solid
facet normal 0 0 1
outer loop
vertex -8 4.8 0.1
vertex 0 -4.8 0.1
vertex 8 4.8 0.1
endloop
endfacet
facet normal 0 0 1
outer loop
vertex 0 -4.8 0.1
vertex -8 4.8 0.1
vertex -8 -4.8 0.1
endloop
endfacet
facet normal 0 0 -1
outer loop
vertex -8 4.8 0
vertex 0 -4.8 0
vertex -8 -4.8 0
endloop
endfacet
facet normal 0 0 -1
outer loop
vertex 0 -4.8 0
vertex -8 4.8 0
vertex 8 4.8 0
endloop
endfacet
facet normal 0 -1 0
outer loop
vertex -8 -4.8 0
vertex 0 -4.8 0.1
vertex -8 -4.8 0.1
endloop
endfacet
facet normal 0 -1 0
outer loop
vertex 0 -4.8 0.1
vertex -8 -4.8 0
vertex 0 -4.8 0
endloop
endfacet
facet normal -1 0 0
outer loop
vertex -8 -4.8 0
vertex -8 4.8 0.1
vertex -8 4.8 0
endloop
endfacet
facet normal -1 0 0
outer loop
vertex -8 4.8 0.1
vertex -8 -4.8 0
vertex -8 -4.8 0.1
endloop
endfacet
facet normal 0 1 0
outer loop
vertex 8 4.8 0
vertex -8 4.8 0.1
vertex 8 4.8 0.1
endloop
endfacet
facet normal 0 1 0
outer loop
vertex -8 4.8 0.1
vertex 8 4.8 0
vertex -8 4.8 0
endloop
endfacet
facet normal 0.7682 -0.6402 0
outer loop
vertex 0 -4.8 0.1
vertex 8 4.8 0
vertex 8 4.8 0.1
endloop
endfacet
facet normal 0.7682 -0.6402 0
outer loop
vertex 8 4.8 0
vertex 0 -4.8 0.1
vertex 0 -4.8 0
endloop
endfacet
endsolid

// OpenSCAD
use <../lib.scad>
function ldraw_lib__164575b() = [
// 0 Sticker Train Front  2 x  6 Stripe Right
// 0 Name: 164575b.dat
// 0 Author: William Howard [WilliamH]
// 0 !LDRAW_ORG Part UPDATE 2014-02
// 0 !LICENSE Licensed under CC BY 2.0 and CC BY 4.0 : see CAreadme.txt
// 
// 0 BFC CERTIFY CCW
  [0,"BFC","CERTIFY"],
  [0,"BFC","CCW"],
// 
// 0 !HISTORY 2013-08-08 [MMR1988] Inlined Subpart and corrected dimensions
// 0 !HISTORY 2014-12-23 [PTadmin] Official Update 2014-02
// 
// 
// 4 15 -20 -0.25 -12 0 -0.25 -12 20 -0.25 12 -20 -0.25 12
  [4,15,-20,-0.25,-12,0,-0.25,-12,20,-0.25,12,-20,-0.25,12],
// 4 16 -20 0 12 20 0 12 0 0 -12 -20 0 -12
  [4,16,-20,0,12,20,0,12,0,0,-12,-20,0,-12],
// 4 16 -20 0 -12 0 0 -12 0 -0.25 -12 -20 -0.25 -12
  [4,16,-20,0,-12,0,0,-12,0,-0.25,-12,-20,-0.25,-12],
// 4 16 -20 0 12 -20 0 -12 -20 -0.25 -12 -20 -0.25 12
  [4,16,-20,0,12,-20,0,-12,-20,-0.25,-12,-20,-0.25,12],
// 4 16 -20 -0.25 12 20 -0.25 12 20 0 12 -20 0 12
  [4,16,-20,-0.25,12,20,-0.25,12,20,0,12,-20,0,12],
// 4 16 20 -0.25 12 0 -0.25 -12 0 0 -12 20 0 12
  [4,16,20,-0.25,12,0,-0.25,-12,0,0,-12,20,0,12],
];
makepoly(ldraw_lib__164575b(), line=0.2);
